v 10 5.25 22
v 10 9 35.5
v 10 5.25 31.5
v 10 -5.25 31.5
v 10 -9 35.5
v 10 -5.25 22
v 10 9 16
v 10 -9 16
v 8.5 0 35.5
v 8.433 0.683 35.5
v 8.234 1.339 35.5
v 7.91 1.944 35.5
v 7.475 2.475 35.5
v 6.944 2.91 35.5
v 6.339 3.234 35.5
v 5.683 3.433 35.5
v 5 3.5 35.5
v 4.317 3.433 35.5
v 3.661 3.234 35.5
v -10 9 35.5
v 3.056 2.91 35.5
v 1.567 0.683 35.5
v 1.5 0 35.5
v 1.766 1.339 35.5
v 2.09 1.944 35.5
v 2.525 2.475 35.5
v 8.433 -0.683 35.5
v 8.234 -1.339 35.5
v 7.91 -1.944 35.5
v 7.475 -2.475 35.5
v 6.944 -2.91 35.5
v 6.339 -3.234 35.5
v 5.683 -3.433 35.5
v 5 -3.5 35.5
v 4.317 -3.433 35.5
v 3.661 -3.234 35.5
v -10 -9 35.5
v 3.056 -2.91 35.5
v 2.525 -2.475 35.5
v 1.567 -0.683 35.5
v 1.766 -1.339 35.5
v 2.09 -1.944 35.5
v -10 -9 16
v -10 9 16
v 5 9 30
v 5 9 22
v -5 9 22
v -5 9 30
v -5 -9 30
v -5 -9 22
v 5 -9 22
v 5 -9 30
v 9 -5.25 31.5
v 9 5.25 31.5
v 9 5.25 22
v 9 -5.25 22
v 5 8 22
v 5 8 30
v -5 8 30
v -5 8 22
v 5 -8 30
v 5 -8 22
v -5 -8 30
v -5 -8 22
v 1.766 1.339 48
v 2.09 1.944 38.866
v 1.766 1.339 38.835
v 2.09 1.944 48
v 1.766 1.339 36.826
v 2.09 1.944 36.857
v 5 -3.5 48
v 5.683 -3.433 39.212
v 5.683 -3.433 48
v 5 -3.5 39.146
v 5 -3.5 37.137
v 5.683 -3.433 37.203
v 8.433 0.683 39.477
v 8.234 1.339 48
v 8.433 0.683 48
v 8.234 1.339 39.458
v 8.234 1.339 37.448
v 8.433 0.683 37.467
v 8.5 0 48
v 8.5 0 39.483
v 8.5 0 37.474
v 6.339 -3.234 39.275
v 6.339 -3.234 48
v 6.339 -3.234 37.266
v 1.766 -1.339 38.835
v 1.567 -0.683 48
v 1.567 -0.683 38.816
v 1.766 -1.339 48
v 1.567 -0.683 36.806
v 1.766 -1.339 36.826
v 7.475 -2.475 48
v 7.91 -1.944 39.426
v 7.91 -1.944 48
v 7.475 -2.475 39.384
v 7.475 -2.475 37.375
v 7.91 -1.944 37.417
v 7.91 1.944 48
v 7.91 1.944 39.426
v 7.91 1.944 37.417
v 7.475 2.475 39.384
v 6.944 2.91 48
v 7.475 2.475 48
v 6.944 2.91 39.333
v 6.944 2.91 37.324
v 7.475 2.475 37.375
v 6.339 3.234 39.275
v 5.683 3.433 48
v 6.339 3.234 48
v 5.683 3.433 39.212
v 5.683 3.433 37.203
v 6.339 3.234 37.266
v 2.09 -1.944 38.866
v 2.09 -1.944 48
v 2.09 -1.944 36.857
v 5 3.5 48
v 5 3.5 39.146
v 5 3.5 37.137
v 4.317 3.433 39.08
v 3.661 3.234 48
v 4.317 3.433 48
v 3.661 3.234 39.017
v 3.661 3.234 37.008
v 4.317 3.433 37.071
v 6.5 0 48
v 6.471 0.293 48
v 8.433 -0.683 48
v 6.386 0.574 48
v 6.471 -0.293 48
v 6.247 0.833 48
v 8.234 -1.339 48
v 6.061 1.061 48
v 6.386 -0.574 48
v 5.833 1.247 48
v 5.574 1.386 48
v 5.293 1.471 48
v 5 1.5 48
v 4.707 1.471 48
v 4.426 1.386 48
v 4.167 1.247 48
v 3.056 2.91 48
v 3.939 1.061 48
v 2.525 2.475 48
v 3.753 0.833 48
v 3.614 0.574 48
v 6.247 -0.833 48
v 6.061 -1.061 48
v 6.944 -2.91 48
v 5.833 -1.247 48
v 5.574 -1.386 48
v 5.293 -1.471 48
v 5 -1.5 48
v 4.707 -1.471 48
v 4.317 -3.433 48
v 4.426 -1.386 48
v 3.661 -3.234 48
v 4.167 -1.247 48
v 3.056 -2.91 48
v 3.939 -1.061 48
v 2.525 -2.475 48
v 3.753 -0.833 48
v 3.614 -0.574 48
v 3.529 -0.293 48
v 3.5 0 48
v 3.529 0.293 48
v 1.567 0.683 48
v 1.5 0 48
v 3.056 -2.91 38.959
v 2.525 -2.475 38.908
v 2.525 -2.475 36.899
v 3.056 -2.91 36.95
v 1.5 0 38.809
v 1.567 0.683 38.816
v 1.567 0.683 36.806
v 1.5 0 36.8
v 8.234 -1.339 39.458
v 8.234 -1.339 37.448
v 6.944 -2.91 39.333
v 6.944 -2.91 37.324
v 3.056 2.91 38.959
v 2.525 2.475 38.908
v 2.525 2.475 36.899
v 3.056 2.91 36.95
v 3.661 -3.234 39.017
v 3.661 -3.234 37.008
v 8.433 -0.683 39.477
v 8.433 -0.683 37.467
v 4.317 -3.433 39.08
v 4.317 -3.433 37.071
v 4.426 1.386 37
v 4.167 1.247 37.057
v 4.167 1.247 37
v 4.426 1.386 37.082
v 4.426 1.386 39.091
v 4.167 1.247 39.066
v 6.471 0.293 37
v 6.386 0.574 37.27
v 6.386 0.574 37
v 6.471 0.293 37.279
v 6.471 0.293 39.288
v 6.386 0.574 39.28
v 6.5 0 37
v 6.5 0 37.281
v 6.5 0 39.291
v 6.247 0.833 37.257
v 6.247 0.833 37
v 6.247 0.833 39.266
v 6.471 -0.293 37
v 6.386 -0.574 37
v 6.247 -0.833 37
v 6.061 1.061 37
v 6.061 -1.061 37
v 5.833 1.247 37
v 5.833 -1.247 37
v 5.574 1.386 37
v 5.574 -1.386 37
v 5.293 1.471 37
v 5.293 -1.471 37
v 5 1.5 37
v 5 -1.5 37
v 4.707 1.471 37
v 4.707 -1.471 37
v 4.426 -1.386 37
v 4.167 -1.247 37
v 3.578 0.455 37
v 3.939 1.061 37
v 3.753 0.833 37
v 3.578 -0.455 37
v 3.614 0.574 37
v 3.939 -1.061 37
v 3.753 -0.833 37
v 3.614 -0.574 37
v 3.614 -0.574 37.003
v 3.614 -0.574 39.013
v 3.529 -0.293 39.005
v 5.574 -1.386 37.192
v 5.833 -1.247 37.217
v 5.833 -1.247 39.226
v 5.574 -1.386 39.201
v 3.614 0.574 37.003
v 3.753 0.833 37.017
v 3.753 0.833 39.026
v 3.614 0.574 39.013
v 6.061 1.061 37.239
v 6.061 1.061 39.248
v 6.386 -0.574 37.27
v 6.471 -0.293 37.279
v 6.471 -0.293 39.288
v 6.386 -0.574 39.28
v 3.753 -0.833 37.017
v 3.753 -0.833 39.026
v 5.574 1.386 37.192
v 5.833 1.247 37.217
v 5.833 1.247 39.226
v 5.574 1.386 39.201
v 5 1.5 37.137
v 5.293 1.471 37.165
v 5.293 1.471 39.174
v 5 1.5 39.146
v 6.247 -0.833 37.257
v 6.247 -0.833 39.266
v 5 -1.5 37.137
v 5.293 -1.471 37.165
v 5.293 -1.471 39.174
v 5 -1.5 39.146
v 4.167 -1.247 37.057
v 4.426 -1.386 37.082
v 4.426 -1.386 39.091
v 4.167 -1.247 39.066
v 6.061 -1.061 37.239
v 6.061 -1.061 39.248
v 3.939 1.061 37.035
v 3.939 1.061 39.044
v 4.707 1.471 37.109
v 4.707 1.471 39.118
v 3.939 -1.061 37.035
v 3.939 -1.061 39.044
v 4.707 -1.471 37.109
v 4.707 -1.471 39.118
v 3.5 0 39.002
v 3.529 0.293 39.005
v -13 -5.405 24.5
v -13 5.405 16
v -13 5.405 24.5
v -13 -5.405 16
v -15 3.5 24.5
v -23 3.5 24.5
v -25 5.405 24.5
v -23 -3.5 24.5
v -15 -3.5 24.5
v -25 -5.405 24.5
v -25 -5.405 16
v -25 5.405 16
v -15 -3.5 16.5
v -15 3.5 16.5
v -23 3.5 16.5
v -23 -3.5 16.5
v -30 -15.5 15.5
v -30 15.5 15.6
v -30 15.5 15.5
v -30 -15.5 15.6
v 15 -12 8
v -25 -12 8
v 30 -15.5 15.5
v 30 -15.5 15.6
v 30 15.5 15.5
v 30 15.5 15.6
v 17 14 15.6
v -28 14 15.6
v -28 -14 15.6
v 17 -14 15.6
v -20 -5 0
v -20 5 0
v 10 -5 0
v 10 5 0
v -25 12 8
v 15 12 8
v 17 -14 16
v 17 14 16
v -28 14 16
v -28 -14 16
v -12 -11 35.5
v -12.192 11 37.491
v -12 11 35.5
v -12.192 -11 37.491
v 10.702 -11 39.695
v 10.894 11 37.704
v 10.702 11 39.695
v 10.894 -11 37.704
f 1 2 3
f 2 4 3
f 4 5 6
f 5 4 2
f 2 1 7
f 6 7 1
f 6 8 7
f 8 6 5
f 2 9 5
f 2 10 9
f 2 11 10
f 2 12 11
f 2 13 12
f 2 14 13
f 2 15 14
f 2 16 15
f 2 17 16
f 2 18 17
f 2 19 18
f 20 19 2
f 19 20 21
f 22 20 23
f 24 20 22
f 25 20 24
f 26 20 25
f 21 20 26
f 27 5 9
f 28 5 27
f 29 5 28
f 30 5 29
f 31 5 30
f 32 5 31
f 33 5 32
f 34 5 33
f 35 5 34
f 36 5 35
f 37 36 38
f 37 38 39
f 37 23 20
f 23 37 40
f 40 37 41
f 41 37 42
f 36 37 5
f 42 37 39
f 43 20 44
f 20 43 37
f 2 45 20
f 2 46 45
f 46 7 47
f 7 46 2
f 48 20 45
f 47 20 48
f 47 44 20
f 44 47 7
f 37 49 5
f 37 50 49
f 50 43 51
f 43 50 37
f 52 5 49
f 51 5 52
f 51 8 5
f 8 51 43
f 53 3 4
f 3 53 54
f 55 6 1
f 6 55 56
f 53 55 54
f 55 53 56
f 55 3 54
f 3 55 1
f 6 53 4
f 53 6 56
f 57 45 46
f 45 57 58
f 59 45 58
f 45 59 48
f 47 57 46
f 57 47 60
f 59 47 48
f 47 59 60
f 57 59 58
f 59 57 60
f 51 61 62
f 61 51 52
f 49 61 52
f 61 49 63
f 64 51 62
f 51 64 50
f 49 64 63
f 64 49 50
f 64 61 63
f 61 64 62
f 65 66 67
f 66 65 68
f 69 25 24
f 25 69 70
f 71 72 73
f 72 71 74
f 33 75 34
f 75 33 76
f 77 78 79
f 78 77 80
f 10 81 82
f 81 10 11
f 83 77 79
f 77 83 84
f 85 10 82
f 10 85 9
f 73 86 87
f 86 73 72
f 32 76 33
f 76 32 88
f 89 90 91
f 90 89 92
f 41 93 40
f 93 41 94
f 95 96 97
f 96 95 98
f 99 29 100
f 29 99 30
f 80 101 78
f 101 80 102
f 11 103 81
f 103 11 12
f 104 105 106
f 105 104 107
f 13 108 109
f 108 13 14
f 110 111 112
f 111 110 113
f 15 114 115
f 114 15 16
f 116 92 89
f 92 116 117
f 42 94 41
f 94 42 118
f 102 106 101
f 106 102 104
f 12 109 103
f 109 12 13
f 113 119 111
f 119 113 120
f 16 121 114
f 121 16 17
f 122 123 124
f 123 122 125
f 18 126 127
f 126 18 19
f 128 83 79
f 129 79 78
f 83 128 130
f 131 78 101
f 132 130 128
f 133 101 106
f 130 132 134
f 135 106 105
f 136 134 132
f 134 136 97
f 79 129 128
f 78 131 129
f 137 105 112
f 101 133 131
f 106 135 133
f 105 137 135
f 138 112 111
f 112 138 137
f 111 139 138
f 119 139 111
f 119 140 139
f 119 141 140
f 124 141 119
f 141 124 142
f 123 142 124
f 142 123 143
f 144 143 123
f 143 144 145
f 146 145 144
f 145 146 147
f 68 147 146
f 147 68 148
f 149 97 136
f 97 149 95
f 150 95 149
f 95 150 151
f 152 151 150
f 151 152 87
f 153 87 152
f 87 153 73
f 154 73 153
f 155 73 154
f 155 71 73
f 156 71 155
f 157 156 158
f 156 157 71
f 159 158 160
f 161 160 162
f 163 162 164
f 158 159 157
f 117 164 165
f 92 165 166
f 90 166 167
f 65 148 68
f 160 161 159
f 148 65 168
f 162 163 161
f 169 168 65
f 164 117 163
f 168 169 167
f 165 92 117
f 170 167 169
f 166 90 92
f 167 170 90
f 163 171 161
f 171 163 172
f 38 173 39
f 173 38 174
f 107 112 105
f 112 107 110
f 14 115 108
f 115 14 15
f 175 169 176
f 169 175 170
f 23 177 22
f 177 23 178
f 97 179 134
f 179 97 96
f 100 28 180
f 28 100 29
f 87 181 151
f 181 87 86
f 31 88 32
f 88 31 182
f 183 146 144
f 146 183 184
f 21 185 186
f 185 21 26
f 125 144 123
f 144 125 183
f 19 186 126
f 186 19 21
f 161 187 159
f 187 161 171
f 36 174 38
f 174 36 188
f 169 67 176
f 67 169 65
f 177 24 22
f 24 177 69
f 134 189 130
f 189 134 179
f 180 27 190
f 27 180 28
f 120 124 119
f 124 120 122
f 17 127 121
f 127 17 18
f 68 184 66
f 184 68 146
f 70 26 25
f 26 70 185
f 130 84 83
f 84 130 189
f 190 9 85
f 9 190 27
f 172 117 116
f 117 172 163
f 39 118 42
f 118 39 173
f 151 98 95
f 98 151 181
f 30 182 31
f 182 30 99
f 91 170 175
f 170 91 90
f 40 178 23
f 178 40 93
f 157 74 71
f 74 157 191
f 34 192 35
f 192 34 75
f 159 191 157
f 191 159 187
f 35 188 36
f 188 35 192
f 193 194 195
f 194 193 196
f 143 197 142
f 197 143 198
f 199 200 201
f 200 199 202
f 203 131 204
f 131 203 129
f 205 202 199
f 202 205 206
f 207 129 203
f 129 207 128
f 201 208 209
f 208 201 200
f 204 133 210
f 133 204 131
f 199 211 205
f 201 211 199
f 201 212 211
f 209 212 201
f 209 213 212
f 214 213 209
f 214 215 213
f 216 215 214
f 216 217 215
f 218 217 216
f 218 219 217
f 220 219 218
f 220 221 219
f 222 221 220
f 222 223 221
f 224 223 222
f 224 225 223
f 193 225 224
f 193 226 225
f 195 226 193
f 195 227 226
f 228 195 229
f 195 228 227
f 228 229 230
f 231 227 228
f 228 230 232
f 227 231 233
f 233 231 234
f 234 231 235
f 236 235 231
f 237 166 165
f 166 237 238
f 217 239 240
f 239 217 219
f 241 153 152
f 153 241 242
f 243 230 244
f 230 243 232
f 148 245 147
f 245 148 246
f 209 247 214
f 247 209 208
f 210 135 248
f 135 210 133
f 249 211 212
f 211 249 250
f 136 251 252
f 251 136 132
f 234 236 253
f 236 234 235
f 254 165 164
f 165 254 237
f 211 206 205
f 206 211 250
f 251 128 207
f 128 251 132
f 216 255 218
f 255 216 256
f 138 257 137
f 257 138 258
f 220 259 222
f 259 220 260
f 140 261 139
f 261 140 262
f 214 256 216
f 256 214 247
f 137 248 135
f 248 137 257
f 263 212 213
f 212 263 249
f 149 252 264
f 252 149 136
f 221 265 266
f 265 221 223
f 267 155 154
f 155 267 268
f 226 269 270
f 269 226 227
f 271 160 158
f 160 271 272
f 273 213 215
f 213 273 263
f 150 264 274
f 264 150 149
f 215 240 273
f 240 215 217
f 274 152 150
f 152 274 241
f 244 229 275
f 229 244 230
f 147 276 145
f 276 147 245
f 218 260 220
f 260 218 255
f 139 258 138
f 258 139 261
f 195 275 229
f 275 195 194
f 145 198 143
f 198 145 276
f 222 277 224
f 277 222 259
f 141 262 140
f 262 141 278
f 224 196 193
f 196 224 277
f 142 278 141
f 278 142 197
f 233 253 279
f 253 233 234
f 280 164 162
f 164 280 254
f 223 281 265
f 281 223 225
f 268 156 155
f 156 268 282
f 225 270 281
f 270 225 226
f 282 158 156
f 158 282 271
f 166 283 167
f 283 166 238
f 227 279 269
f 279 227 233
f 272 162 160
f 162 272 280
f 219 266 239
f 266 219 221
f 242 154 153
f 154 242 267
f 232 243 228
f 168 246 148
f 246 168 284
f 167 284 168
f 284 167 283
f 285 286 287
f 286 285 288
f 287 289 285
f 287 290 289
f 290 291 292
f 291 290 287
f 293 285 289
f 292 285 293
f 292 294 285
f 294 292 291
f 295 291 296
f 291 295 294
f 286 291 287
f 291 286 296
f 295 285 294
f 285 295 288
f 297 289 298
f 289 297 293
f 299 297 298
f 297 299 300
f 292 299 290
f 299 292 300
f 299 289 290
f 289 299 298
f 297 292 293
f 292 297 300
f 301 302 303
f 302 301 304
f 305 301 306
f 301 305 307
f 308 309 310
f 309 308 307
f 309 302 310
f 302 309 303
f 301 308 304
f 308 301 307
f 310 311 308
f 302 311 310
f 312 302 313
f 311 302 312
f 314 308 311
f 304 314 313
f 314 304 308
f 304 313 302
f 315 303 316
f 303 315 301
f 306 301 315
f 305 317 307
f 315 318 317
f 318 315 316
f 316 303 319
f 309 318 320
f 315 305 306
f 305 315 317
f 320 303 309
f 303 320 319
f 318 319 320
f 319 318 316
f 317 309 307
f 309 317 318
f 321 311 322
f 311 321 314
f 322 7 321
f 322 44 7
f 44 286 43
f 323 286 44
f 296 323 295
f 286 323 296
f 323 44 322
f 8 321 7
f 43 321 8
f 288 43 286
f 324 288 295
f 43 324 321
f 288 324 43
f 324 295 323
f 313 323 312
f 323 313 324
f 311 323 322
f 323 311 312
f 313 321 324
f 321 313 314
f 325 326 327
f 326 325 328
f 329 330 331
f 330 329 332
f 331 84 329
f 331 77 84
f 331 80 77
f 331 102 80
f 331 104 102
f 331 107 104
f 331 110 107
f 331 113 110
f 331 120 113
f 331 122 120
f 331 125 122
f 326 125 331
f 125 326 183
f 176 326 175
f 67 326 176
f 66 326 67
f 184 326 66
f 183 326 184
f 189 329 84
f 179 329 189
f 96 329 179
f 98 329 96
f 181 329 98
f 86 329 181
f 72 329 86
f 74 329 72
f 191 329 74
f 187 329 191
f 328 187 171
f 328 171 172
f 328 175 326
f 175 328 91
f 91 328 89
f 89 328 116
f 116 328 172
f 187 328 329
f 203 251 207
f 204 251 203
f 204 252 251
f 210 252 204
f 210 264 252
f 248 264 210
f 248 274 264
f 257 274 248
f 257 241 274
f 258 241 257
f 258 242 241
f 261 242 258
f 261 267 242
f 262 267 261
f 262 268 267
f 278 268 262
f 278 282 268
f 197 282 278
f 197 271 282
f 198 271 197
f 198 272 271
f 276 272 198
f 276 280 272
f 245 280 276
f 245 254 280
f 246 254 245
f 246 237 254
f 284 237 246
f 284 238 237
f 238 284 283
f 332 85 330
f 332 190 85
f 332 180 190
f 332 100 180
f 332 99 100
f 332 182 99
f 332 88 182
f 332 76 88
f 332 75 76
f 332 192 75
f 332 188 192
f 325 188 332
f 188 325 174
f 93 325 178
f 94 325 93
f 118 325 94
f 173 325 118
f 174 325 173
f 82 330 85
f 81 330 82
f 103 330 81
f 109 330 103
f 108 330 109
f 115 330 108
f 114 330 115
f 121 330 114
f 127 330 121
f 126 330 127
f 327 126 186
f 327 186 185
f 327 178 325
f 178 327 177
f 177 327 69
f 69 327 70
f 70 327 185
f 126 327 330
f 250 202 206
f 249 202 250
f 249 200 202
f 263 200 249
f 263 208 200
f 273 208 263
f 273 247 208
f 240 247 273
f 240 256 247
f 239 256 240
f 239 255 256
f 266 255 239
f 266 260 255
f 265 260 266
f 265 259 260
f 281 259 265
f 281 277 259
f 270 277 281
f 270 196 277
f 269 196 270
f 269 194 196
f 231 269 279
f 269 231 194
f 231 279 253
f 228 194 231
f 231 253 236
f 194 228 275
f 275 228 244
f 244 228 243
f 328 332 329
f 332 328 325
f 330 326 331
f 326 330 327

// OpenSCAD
// 3DBenchy OpenSCAD model (Approximation)

module benchy() {
    // Hull
    hull() {
        translate([-20, -5, 0]) cube([30, 10, 0.1]);
        translate([-25, -12, 8]) cube([40, 24, 0.1]);
        translate([-30, -15.5, 15.5]) cube([60, 31, 0.1]);
    }

    // Deck
    translate([-28, -14, 14]) cube([45, 28, 2]);

    // Cabin
    difference() {
        translate([-10, -9, 15.5]) cube([20, 18, 20]);
        // Front Window
        translate([9, -5.25, 22]) cube([2, 10.5, 9.5]);
        // Side Windows
        translate([-5, 8, 22]) cube([10, 2, 8]);
        translate([-5, -10, 22]) cube([10, 2, 8]);
    }

    // Roof
    translate([-12, -11, 35.5])
    rotate([0, -5.5, 0])
    cube([23, 22, 2]);

    // Chimney
    translate([5, 0, 34])
    difference() {
        cylinder(h=14, r=3.5, $fn=32);
        translate([0, 0, 3]) cylinder(h=11.1, r=1.5, $fn=32);
    }

    // Cargo Box
    translate([-25, -5.405, 15.5])
    difference() {
        cube([12, 10.81, 9]);
        translate([2, 1.905, 1]) cube([8, 7, 9]);
    }
}

benchy();
